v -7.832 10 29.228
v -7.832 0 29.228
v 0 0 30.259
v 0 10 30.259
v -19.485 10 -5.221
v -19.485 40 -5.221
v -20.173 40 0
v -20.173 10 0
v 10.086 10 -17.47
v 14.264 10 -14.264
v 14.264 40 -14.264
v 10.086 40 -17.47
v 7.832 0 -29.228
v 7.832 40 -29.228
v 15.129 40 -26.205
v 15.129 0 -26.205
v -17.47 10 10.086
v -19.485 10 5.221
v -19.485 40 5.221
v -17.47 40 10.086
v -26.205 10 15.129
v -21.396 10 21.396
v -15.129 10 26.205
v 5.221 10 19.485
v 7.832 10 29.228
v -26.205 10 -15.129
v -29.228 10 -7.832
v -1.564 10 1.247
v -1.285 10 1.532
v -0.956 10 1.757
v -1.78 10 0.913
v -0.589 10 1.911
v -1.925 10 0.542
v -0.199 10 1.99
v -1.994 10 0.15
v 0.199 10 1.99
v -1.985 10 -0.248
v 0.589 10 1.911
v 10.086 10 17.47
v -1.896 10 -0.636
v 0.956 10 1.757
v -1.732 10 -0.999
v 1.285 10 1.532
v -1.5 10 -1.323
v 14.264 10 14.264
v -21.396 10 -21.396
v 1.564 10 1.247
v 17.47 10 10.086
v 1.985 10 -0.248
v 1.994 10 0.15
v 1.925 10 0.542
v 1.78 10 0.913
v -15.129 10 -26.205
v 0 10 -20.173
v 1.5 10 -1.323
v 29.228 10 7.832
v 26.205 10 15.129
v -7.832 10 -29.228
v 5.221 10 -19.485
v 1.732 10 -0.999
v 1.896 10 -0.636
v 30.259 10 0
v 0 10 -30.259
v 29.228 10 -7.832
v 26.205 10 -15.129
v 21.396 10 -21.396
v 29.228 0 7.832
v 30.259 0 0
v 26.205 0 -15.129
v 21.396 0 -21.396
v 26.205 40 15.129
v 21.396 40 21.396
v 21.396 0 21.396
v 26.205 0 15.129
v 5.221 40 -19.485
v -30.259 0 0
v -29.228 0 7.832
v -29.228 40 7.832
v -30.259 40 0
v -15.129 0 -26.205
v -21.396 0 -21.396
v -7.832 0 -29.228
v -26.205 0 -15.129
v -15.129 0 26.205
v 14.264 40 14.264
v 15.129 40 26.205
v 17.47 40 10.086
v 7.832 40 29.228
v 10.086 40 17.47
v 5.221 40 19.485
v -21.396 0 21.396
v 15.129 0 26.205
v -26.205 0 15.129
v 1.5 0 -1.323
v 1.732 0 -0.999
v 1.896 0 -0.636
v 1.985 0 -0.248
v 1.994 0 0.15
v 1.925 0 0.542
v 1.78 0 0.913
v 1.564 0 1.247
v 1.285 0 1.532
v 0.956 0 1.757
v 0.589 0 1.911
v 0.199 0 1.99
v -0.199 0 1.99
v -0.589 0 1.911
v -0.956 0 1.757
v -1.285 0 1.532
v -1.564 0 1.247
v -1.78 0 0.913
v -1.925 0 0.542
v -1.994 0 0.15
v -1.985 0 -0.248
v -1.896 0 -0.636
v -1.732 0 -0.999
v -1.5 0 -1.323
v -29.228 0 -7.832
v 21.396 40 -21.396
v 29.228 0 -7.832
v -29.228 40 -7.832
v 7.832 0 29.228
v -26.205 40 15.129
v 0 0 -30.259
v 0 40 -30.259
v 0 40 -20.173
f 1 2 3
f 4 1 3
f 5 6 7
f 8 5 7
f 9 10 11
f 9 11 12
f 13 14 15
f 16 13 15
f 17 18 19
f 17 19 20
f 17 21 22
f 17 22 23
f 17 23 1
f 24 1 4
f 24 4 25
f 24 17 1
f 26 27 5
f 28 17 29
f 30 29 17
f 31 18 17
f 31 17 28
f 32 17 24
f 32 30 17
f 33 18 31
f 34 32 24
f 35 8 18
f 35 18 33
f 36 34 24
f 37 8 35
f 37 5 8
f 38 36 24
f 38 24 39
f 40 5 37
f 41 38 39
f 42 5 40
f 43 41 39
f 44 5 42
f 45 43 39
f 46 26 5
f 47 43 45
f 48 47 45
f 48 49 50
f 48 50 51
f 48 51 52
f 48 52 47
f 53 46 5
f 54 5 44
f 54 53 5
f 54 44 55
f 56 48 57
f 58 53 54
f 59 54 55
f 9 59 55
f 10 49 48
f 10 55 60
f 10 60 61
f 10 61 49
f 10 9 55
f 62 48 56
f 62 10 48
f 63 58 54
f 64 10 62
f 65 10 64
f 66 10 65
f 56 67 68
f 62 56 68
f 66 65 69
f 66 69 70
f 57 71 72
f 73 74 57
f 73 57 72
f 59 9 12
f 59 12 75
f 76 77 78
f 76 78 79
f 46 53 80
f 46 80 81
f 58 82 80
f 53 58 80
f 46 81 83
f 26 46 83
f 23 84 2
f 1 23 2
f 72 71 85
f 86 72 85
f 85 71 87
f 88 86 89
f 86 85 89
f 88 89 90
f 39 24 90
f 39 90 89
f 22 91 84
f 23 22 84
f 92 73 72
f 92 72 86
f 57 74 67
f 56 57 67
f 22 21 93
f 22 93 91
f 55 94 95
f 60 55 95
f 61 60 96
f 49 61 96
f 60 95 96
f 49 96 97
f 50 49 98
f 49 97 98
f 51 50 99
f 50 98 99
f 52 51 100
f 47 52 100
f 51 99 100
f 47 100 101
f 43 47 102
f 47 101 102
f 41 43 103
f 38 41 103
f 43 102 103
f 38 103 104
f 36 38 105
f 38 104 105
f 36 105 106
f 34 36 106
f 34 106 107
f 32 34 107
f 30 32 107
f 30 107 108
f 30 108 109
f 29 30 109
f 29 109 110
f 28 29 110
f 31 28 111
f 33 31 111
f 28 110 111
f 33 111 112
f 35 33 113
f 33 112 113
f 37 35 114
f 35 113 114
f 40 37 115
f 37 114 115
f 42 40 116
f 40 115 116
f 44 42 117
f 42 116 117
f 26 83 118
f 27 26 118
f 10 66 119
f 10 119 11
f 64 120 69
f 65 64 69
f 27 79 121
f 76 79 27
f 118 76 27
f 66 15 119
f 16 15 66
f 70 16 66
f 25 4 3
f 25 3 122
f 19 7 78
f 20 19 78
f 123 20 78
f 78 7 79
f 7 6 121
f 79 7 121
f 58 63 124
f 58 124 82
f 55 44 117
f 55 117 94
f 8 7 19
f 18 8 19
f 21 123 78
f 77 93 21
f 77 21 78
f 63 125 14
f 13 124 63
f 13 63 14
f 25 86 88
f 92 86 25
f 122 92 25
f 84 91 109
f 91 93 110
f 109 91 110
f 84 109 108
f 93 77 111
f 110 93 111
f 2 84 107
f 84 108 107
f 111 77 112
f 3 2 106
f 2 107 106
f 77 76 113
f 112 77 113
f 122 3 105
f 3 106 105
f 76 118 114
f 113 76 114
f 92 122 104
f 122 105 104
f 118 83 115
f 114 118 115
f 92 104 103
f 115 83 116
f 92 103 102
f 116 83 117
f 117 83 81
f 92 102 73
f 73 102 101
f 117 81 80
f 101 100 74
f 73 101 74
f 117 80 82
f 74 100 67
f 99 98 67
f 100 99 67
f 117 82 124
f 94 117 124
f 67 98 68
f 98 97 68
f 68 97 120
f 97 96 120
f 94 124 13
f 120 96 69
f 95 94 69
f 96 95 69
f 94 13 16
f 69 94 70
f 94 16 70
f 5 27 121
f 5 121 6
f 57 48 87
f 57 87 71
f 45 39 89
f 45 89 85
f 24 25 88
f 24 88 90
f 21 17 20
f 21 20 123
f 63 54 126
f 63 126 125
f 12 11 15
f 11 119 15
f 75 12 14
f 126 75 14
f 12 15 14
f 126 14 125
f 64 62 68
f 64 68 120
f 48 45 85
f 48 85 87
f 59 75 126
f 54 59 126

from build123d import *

# Parameters (mm, degrees)
BOSS_EXTRUDE3_DEPTH   = 40
BOSS_EXTRUDE3_2_DEPTH = 40
BOSS_EXTRUDE3_3_DEPTH = 40
BOSS_EXTRUDE4_DEPTH   = 10


with BuildPart() as part:
    # Sketch1 → Boss-Extrude3 (new body)
    with BuildSketch(Plane(origin=(0, 0, 0), x_dir=(1, 0, 0), z_dir=(0, 1, 0))):
        Polygon((0, 30.258868817), (0, 20.172579212), (5.221047689, 19.485215243), (10.086289606, 17.469966057), (14.264167555, 14.264167555), (21.396251332, 21.396251332), (15.129434409, 26.204949086), (7.831571533, 29.227822865), align=None)
    extrude(amount=BOSS_EXTRUDE3_DEPTH)



with BuildPart() as body_2:
    # Sketch1 → Boss-Extrude3 2 (new body)
    with BuildSketch(Plane(origin=(0, 0, 0), x_dir=(1, 0, 0), z_dir=(0, 1, 0))):
        Polygon((-20.172579212, 0), (-19.485215243, 5.221047689), (-29.227822865, 7.831571533), (-30.258868817, 0), (-29.227822865, -7.831571533), (-26.204949086, -15.129434409), (-17.469966057, -10.086289606), (-19.485215243, -5.221047689), align=None)
    extrude(amount=BOSS_EXTRUDE3_2_DEPTH)


with BuildPart() as body_3:
    # Sketch1 → Boss-Extrude3 3 (new body)
    with BuildSketch(Plane(origin=(0, 0, 0), x_dir=(1, 0, 0), z_dir=(0, 1, 0))):
        Polygon((26.204949086, -15.129434409), (17.469966057, -10.086289606), (14.264167555, -14.264167555), (10.086289606, -17.469966057), (5.221047689, -19.485215243), (7.831571533, -29.227822865), (15.129434409, -26.204949086), (21.396251332, -21.396251332), align=None)
    extrude(amount=BOSS_EXTRUDE3_3_DEPTH)


with BuildPart() as part_1:
    add(part.part)

    add(body_2.part)  # Boss-Extrude4 merges body 2

    add(body_3.part)  # Boss-Extrude4 merges body 3
    # Sketch1<6> → Boss-Extrude4 (add)
    with BuildSketch(Plane(origin=(0, 0, 0), x_dir=(1, 0, 0), z_dir=(0, 1, 0))):
        Polygon((-29.227822865, 7.831571533), (-19.485215243, 5.221047689), (-20.172579212, 0), (-19.485215243, -5.221047689), (-17.469966057, -10.086289606), (-26.204949086, -15.129434409), (-21.396251332, -21.396251332), (-15.129434409, -26.204949086), (-7.831571533, -29.227822865), (0, -30.258868817), (7.831571533, -29.227822865), (5.221047689, -19.485215243), (10.086289606, -17.469966057), (14.264167555, -14.264167555), (17.469966057, -10.086289606), (26.204949086, -15.129434409), (29.227822865, -7.831571533), (30.258868817, 0), (29.227822865, 7.831571533), (26.204949086, 15.129434409), (21.396251332, 21.396251332), (14.264167555, 14.264167555), (10.086289606, 17.469966057), (5.221047689, 19.485215243), (0, 20.172579212), (0, 30.258868817), (-7.831571533, 29.227822865), (-15.129434409, 26.204949086), (-21.396251332, 21.396251332), (-26.204949086, 15.129434409), align=None)
        with BuildLine():
            ThreePointArc((1.5, 1.322875656), (0, -2), (-1.5, 1.322875656))
            Line((-1.5, 1.322875656), (1.5, 1.322875656))
        make_face(mode=Mode.SUBTRACT)
    extrude(amount=BOSS_EXTRUDE4_DEPTH)


solid = part_1.part
